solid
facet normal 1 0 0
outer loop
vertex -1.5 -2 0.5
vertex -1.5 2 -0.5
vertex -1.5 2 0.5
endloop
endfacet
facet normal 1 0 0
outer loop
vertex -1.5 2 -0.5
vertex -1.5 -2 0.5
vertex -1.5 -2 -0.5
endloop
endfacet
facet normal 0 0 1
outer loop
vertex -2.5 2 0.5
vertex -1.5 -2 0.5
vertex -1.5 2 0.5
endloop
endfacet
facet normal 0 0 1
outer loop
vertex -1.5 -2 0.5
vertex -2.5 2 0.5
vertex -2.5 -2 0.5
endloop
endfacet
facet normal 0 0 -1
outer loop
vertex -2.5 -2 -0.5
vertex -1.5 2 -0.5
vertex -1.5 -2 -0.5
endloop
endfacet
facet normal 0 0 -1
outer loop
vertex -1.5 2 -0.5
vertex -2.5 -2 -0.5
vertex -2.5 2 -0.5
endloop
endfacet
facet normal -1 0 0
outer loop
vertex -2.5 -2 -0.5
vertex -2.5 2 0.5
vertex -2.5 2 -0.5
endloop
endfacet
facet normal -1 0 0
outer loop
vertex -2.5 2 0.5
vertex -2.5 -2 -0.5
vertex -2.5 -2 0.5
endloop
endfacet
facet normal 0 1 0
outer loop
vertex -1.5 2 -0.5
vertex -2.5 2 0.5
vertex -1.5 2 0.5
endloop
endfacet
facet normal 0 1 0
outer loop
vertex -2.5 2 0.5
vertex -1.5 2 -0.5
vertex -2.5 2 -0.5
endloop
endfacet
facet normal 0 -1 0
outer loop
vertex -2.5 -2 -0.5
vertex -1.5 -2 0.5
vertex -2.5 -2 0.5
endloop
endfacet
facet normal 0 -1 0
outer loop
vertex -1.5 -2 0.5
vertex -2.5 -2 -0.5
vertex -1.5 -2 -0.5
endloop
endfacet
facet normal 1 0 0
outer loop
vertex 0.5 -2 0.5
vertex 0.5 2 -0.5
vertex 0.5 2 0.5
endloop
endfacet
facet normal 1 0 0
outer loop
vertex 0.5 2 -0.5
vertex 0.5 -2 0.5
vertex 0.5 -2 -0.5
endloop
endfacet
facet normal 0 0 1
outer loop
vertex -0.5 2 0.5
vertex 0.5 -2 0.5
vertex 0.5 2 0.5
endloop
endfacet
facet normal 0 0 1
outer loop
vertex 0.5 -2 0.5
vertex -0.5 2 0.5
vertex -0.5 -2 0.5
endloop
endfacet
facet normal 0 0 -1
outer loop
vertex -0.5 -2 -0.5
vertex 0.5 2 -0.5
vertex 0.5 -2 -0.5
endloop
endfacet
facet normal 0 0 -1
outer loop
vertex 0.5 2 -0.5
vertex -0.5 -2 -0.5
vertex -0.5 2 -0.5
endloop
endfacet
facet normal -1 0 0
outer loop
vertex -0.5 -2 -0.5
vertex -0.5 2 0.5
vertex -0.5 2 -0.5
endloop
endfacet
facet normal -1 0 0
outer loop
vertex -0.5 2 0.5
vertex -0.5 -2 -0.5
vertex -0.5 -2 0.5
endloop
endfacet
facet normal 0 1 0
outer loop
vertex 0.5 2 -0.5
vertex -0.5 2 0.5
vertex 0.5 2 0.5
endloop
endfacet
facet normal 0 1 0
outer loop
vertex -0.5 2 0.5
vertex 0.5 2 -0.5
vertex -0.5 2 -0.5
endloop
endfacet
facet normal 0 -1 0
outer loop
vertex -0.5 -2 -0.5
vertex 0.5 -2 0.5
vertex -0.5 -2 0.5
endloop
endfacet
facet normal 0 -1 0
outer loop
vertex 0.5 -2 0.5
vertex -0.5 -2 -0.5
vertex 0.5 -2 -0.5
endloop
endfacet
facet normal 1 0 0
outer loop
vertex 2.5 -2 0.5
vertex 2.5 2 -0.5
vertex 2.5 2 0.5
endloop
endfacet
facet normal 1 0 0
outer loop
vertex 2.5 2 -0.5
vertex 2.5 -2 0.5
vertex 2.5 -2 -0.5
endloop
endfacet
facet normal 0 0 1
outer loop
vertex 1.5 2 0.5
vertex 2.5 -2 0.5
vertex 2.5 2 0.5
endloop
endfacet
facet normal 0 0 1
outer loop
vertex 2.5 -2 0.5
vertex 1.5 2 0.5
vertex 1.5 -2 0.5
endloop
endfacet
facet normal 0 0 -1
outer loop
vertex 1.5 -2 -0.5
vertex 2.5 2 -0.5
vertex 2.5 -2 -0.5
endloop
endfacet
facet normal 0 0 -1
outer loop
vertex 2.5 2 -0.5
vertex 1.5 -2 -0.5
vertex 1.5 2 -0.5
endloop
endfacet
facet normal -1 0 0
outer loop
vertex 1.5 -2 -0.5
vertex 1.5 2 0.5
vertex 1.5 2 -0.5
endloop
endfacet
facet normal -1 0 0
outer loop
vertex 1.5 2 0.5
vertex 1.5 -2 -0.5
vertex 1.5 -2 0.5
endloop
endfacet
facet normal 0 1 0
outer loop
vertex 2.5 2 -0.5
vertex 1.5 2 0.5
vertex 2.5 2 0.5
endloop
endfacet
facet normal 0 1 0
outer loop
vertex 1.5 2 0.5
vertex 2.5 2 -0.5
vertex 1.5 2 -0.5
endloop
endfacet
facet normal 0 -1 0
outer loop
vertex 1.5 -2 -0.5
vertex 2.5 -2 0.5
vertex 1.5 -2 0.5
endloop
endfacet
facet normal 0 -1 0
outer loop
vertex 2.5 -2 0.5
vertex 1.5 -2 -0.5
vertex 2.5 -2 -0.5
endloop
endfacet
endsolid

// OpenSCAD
include <../openscad2calculix.scad>

os2cx_material_elastic_simple(
    "steel",
    youngs_modulus=[209, "GPa"],
    poissons_ratio=0.3,
    density=[7.87, "g/cm^3"]);

os2cx_mesh("test_a", material="steel") {
    translate([-2, 0, 0]) cube([1.0, 4.0, 1.0], center=true);
}

os2cx_mesh("test_b", max_element_size=0.1, material="steel") {
    translate([0, 0, 0]) cube([1.0, 4.0, 1.0], center=true);
}

os2cx_mesh("test_c", material="steel") {
    translate([2, 0, 0]) cube([1.0, 4.0, 1.0], center=true);
}
os2cx_select_volume("test_c_subset") {
    translate([2, 2, 0]) cube([1.1, 2.0, 1.1], center=true);
}
os2cx_override_max_element_size("test_c_subset", 0.1);

os2cx_analysis_custom([
    "*INCLUDE, INPUT=objects.inp",
    "*STEP",
    "*NO ANALYSIS",
    "*END STEP",
], unit_system=["mm", "kg", "s"]);
